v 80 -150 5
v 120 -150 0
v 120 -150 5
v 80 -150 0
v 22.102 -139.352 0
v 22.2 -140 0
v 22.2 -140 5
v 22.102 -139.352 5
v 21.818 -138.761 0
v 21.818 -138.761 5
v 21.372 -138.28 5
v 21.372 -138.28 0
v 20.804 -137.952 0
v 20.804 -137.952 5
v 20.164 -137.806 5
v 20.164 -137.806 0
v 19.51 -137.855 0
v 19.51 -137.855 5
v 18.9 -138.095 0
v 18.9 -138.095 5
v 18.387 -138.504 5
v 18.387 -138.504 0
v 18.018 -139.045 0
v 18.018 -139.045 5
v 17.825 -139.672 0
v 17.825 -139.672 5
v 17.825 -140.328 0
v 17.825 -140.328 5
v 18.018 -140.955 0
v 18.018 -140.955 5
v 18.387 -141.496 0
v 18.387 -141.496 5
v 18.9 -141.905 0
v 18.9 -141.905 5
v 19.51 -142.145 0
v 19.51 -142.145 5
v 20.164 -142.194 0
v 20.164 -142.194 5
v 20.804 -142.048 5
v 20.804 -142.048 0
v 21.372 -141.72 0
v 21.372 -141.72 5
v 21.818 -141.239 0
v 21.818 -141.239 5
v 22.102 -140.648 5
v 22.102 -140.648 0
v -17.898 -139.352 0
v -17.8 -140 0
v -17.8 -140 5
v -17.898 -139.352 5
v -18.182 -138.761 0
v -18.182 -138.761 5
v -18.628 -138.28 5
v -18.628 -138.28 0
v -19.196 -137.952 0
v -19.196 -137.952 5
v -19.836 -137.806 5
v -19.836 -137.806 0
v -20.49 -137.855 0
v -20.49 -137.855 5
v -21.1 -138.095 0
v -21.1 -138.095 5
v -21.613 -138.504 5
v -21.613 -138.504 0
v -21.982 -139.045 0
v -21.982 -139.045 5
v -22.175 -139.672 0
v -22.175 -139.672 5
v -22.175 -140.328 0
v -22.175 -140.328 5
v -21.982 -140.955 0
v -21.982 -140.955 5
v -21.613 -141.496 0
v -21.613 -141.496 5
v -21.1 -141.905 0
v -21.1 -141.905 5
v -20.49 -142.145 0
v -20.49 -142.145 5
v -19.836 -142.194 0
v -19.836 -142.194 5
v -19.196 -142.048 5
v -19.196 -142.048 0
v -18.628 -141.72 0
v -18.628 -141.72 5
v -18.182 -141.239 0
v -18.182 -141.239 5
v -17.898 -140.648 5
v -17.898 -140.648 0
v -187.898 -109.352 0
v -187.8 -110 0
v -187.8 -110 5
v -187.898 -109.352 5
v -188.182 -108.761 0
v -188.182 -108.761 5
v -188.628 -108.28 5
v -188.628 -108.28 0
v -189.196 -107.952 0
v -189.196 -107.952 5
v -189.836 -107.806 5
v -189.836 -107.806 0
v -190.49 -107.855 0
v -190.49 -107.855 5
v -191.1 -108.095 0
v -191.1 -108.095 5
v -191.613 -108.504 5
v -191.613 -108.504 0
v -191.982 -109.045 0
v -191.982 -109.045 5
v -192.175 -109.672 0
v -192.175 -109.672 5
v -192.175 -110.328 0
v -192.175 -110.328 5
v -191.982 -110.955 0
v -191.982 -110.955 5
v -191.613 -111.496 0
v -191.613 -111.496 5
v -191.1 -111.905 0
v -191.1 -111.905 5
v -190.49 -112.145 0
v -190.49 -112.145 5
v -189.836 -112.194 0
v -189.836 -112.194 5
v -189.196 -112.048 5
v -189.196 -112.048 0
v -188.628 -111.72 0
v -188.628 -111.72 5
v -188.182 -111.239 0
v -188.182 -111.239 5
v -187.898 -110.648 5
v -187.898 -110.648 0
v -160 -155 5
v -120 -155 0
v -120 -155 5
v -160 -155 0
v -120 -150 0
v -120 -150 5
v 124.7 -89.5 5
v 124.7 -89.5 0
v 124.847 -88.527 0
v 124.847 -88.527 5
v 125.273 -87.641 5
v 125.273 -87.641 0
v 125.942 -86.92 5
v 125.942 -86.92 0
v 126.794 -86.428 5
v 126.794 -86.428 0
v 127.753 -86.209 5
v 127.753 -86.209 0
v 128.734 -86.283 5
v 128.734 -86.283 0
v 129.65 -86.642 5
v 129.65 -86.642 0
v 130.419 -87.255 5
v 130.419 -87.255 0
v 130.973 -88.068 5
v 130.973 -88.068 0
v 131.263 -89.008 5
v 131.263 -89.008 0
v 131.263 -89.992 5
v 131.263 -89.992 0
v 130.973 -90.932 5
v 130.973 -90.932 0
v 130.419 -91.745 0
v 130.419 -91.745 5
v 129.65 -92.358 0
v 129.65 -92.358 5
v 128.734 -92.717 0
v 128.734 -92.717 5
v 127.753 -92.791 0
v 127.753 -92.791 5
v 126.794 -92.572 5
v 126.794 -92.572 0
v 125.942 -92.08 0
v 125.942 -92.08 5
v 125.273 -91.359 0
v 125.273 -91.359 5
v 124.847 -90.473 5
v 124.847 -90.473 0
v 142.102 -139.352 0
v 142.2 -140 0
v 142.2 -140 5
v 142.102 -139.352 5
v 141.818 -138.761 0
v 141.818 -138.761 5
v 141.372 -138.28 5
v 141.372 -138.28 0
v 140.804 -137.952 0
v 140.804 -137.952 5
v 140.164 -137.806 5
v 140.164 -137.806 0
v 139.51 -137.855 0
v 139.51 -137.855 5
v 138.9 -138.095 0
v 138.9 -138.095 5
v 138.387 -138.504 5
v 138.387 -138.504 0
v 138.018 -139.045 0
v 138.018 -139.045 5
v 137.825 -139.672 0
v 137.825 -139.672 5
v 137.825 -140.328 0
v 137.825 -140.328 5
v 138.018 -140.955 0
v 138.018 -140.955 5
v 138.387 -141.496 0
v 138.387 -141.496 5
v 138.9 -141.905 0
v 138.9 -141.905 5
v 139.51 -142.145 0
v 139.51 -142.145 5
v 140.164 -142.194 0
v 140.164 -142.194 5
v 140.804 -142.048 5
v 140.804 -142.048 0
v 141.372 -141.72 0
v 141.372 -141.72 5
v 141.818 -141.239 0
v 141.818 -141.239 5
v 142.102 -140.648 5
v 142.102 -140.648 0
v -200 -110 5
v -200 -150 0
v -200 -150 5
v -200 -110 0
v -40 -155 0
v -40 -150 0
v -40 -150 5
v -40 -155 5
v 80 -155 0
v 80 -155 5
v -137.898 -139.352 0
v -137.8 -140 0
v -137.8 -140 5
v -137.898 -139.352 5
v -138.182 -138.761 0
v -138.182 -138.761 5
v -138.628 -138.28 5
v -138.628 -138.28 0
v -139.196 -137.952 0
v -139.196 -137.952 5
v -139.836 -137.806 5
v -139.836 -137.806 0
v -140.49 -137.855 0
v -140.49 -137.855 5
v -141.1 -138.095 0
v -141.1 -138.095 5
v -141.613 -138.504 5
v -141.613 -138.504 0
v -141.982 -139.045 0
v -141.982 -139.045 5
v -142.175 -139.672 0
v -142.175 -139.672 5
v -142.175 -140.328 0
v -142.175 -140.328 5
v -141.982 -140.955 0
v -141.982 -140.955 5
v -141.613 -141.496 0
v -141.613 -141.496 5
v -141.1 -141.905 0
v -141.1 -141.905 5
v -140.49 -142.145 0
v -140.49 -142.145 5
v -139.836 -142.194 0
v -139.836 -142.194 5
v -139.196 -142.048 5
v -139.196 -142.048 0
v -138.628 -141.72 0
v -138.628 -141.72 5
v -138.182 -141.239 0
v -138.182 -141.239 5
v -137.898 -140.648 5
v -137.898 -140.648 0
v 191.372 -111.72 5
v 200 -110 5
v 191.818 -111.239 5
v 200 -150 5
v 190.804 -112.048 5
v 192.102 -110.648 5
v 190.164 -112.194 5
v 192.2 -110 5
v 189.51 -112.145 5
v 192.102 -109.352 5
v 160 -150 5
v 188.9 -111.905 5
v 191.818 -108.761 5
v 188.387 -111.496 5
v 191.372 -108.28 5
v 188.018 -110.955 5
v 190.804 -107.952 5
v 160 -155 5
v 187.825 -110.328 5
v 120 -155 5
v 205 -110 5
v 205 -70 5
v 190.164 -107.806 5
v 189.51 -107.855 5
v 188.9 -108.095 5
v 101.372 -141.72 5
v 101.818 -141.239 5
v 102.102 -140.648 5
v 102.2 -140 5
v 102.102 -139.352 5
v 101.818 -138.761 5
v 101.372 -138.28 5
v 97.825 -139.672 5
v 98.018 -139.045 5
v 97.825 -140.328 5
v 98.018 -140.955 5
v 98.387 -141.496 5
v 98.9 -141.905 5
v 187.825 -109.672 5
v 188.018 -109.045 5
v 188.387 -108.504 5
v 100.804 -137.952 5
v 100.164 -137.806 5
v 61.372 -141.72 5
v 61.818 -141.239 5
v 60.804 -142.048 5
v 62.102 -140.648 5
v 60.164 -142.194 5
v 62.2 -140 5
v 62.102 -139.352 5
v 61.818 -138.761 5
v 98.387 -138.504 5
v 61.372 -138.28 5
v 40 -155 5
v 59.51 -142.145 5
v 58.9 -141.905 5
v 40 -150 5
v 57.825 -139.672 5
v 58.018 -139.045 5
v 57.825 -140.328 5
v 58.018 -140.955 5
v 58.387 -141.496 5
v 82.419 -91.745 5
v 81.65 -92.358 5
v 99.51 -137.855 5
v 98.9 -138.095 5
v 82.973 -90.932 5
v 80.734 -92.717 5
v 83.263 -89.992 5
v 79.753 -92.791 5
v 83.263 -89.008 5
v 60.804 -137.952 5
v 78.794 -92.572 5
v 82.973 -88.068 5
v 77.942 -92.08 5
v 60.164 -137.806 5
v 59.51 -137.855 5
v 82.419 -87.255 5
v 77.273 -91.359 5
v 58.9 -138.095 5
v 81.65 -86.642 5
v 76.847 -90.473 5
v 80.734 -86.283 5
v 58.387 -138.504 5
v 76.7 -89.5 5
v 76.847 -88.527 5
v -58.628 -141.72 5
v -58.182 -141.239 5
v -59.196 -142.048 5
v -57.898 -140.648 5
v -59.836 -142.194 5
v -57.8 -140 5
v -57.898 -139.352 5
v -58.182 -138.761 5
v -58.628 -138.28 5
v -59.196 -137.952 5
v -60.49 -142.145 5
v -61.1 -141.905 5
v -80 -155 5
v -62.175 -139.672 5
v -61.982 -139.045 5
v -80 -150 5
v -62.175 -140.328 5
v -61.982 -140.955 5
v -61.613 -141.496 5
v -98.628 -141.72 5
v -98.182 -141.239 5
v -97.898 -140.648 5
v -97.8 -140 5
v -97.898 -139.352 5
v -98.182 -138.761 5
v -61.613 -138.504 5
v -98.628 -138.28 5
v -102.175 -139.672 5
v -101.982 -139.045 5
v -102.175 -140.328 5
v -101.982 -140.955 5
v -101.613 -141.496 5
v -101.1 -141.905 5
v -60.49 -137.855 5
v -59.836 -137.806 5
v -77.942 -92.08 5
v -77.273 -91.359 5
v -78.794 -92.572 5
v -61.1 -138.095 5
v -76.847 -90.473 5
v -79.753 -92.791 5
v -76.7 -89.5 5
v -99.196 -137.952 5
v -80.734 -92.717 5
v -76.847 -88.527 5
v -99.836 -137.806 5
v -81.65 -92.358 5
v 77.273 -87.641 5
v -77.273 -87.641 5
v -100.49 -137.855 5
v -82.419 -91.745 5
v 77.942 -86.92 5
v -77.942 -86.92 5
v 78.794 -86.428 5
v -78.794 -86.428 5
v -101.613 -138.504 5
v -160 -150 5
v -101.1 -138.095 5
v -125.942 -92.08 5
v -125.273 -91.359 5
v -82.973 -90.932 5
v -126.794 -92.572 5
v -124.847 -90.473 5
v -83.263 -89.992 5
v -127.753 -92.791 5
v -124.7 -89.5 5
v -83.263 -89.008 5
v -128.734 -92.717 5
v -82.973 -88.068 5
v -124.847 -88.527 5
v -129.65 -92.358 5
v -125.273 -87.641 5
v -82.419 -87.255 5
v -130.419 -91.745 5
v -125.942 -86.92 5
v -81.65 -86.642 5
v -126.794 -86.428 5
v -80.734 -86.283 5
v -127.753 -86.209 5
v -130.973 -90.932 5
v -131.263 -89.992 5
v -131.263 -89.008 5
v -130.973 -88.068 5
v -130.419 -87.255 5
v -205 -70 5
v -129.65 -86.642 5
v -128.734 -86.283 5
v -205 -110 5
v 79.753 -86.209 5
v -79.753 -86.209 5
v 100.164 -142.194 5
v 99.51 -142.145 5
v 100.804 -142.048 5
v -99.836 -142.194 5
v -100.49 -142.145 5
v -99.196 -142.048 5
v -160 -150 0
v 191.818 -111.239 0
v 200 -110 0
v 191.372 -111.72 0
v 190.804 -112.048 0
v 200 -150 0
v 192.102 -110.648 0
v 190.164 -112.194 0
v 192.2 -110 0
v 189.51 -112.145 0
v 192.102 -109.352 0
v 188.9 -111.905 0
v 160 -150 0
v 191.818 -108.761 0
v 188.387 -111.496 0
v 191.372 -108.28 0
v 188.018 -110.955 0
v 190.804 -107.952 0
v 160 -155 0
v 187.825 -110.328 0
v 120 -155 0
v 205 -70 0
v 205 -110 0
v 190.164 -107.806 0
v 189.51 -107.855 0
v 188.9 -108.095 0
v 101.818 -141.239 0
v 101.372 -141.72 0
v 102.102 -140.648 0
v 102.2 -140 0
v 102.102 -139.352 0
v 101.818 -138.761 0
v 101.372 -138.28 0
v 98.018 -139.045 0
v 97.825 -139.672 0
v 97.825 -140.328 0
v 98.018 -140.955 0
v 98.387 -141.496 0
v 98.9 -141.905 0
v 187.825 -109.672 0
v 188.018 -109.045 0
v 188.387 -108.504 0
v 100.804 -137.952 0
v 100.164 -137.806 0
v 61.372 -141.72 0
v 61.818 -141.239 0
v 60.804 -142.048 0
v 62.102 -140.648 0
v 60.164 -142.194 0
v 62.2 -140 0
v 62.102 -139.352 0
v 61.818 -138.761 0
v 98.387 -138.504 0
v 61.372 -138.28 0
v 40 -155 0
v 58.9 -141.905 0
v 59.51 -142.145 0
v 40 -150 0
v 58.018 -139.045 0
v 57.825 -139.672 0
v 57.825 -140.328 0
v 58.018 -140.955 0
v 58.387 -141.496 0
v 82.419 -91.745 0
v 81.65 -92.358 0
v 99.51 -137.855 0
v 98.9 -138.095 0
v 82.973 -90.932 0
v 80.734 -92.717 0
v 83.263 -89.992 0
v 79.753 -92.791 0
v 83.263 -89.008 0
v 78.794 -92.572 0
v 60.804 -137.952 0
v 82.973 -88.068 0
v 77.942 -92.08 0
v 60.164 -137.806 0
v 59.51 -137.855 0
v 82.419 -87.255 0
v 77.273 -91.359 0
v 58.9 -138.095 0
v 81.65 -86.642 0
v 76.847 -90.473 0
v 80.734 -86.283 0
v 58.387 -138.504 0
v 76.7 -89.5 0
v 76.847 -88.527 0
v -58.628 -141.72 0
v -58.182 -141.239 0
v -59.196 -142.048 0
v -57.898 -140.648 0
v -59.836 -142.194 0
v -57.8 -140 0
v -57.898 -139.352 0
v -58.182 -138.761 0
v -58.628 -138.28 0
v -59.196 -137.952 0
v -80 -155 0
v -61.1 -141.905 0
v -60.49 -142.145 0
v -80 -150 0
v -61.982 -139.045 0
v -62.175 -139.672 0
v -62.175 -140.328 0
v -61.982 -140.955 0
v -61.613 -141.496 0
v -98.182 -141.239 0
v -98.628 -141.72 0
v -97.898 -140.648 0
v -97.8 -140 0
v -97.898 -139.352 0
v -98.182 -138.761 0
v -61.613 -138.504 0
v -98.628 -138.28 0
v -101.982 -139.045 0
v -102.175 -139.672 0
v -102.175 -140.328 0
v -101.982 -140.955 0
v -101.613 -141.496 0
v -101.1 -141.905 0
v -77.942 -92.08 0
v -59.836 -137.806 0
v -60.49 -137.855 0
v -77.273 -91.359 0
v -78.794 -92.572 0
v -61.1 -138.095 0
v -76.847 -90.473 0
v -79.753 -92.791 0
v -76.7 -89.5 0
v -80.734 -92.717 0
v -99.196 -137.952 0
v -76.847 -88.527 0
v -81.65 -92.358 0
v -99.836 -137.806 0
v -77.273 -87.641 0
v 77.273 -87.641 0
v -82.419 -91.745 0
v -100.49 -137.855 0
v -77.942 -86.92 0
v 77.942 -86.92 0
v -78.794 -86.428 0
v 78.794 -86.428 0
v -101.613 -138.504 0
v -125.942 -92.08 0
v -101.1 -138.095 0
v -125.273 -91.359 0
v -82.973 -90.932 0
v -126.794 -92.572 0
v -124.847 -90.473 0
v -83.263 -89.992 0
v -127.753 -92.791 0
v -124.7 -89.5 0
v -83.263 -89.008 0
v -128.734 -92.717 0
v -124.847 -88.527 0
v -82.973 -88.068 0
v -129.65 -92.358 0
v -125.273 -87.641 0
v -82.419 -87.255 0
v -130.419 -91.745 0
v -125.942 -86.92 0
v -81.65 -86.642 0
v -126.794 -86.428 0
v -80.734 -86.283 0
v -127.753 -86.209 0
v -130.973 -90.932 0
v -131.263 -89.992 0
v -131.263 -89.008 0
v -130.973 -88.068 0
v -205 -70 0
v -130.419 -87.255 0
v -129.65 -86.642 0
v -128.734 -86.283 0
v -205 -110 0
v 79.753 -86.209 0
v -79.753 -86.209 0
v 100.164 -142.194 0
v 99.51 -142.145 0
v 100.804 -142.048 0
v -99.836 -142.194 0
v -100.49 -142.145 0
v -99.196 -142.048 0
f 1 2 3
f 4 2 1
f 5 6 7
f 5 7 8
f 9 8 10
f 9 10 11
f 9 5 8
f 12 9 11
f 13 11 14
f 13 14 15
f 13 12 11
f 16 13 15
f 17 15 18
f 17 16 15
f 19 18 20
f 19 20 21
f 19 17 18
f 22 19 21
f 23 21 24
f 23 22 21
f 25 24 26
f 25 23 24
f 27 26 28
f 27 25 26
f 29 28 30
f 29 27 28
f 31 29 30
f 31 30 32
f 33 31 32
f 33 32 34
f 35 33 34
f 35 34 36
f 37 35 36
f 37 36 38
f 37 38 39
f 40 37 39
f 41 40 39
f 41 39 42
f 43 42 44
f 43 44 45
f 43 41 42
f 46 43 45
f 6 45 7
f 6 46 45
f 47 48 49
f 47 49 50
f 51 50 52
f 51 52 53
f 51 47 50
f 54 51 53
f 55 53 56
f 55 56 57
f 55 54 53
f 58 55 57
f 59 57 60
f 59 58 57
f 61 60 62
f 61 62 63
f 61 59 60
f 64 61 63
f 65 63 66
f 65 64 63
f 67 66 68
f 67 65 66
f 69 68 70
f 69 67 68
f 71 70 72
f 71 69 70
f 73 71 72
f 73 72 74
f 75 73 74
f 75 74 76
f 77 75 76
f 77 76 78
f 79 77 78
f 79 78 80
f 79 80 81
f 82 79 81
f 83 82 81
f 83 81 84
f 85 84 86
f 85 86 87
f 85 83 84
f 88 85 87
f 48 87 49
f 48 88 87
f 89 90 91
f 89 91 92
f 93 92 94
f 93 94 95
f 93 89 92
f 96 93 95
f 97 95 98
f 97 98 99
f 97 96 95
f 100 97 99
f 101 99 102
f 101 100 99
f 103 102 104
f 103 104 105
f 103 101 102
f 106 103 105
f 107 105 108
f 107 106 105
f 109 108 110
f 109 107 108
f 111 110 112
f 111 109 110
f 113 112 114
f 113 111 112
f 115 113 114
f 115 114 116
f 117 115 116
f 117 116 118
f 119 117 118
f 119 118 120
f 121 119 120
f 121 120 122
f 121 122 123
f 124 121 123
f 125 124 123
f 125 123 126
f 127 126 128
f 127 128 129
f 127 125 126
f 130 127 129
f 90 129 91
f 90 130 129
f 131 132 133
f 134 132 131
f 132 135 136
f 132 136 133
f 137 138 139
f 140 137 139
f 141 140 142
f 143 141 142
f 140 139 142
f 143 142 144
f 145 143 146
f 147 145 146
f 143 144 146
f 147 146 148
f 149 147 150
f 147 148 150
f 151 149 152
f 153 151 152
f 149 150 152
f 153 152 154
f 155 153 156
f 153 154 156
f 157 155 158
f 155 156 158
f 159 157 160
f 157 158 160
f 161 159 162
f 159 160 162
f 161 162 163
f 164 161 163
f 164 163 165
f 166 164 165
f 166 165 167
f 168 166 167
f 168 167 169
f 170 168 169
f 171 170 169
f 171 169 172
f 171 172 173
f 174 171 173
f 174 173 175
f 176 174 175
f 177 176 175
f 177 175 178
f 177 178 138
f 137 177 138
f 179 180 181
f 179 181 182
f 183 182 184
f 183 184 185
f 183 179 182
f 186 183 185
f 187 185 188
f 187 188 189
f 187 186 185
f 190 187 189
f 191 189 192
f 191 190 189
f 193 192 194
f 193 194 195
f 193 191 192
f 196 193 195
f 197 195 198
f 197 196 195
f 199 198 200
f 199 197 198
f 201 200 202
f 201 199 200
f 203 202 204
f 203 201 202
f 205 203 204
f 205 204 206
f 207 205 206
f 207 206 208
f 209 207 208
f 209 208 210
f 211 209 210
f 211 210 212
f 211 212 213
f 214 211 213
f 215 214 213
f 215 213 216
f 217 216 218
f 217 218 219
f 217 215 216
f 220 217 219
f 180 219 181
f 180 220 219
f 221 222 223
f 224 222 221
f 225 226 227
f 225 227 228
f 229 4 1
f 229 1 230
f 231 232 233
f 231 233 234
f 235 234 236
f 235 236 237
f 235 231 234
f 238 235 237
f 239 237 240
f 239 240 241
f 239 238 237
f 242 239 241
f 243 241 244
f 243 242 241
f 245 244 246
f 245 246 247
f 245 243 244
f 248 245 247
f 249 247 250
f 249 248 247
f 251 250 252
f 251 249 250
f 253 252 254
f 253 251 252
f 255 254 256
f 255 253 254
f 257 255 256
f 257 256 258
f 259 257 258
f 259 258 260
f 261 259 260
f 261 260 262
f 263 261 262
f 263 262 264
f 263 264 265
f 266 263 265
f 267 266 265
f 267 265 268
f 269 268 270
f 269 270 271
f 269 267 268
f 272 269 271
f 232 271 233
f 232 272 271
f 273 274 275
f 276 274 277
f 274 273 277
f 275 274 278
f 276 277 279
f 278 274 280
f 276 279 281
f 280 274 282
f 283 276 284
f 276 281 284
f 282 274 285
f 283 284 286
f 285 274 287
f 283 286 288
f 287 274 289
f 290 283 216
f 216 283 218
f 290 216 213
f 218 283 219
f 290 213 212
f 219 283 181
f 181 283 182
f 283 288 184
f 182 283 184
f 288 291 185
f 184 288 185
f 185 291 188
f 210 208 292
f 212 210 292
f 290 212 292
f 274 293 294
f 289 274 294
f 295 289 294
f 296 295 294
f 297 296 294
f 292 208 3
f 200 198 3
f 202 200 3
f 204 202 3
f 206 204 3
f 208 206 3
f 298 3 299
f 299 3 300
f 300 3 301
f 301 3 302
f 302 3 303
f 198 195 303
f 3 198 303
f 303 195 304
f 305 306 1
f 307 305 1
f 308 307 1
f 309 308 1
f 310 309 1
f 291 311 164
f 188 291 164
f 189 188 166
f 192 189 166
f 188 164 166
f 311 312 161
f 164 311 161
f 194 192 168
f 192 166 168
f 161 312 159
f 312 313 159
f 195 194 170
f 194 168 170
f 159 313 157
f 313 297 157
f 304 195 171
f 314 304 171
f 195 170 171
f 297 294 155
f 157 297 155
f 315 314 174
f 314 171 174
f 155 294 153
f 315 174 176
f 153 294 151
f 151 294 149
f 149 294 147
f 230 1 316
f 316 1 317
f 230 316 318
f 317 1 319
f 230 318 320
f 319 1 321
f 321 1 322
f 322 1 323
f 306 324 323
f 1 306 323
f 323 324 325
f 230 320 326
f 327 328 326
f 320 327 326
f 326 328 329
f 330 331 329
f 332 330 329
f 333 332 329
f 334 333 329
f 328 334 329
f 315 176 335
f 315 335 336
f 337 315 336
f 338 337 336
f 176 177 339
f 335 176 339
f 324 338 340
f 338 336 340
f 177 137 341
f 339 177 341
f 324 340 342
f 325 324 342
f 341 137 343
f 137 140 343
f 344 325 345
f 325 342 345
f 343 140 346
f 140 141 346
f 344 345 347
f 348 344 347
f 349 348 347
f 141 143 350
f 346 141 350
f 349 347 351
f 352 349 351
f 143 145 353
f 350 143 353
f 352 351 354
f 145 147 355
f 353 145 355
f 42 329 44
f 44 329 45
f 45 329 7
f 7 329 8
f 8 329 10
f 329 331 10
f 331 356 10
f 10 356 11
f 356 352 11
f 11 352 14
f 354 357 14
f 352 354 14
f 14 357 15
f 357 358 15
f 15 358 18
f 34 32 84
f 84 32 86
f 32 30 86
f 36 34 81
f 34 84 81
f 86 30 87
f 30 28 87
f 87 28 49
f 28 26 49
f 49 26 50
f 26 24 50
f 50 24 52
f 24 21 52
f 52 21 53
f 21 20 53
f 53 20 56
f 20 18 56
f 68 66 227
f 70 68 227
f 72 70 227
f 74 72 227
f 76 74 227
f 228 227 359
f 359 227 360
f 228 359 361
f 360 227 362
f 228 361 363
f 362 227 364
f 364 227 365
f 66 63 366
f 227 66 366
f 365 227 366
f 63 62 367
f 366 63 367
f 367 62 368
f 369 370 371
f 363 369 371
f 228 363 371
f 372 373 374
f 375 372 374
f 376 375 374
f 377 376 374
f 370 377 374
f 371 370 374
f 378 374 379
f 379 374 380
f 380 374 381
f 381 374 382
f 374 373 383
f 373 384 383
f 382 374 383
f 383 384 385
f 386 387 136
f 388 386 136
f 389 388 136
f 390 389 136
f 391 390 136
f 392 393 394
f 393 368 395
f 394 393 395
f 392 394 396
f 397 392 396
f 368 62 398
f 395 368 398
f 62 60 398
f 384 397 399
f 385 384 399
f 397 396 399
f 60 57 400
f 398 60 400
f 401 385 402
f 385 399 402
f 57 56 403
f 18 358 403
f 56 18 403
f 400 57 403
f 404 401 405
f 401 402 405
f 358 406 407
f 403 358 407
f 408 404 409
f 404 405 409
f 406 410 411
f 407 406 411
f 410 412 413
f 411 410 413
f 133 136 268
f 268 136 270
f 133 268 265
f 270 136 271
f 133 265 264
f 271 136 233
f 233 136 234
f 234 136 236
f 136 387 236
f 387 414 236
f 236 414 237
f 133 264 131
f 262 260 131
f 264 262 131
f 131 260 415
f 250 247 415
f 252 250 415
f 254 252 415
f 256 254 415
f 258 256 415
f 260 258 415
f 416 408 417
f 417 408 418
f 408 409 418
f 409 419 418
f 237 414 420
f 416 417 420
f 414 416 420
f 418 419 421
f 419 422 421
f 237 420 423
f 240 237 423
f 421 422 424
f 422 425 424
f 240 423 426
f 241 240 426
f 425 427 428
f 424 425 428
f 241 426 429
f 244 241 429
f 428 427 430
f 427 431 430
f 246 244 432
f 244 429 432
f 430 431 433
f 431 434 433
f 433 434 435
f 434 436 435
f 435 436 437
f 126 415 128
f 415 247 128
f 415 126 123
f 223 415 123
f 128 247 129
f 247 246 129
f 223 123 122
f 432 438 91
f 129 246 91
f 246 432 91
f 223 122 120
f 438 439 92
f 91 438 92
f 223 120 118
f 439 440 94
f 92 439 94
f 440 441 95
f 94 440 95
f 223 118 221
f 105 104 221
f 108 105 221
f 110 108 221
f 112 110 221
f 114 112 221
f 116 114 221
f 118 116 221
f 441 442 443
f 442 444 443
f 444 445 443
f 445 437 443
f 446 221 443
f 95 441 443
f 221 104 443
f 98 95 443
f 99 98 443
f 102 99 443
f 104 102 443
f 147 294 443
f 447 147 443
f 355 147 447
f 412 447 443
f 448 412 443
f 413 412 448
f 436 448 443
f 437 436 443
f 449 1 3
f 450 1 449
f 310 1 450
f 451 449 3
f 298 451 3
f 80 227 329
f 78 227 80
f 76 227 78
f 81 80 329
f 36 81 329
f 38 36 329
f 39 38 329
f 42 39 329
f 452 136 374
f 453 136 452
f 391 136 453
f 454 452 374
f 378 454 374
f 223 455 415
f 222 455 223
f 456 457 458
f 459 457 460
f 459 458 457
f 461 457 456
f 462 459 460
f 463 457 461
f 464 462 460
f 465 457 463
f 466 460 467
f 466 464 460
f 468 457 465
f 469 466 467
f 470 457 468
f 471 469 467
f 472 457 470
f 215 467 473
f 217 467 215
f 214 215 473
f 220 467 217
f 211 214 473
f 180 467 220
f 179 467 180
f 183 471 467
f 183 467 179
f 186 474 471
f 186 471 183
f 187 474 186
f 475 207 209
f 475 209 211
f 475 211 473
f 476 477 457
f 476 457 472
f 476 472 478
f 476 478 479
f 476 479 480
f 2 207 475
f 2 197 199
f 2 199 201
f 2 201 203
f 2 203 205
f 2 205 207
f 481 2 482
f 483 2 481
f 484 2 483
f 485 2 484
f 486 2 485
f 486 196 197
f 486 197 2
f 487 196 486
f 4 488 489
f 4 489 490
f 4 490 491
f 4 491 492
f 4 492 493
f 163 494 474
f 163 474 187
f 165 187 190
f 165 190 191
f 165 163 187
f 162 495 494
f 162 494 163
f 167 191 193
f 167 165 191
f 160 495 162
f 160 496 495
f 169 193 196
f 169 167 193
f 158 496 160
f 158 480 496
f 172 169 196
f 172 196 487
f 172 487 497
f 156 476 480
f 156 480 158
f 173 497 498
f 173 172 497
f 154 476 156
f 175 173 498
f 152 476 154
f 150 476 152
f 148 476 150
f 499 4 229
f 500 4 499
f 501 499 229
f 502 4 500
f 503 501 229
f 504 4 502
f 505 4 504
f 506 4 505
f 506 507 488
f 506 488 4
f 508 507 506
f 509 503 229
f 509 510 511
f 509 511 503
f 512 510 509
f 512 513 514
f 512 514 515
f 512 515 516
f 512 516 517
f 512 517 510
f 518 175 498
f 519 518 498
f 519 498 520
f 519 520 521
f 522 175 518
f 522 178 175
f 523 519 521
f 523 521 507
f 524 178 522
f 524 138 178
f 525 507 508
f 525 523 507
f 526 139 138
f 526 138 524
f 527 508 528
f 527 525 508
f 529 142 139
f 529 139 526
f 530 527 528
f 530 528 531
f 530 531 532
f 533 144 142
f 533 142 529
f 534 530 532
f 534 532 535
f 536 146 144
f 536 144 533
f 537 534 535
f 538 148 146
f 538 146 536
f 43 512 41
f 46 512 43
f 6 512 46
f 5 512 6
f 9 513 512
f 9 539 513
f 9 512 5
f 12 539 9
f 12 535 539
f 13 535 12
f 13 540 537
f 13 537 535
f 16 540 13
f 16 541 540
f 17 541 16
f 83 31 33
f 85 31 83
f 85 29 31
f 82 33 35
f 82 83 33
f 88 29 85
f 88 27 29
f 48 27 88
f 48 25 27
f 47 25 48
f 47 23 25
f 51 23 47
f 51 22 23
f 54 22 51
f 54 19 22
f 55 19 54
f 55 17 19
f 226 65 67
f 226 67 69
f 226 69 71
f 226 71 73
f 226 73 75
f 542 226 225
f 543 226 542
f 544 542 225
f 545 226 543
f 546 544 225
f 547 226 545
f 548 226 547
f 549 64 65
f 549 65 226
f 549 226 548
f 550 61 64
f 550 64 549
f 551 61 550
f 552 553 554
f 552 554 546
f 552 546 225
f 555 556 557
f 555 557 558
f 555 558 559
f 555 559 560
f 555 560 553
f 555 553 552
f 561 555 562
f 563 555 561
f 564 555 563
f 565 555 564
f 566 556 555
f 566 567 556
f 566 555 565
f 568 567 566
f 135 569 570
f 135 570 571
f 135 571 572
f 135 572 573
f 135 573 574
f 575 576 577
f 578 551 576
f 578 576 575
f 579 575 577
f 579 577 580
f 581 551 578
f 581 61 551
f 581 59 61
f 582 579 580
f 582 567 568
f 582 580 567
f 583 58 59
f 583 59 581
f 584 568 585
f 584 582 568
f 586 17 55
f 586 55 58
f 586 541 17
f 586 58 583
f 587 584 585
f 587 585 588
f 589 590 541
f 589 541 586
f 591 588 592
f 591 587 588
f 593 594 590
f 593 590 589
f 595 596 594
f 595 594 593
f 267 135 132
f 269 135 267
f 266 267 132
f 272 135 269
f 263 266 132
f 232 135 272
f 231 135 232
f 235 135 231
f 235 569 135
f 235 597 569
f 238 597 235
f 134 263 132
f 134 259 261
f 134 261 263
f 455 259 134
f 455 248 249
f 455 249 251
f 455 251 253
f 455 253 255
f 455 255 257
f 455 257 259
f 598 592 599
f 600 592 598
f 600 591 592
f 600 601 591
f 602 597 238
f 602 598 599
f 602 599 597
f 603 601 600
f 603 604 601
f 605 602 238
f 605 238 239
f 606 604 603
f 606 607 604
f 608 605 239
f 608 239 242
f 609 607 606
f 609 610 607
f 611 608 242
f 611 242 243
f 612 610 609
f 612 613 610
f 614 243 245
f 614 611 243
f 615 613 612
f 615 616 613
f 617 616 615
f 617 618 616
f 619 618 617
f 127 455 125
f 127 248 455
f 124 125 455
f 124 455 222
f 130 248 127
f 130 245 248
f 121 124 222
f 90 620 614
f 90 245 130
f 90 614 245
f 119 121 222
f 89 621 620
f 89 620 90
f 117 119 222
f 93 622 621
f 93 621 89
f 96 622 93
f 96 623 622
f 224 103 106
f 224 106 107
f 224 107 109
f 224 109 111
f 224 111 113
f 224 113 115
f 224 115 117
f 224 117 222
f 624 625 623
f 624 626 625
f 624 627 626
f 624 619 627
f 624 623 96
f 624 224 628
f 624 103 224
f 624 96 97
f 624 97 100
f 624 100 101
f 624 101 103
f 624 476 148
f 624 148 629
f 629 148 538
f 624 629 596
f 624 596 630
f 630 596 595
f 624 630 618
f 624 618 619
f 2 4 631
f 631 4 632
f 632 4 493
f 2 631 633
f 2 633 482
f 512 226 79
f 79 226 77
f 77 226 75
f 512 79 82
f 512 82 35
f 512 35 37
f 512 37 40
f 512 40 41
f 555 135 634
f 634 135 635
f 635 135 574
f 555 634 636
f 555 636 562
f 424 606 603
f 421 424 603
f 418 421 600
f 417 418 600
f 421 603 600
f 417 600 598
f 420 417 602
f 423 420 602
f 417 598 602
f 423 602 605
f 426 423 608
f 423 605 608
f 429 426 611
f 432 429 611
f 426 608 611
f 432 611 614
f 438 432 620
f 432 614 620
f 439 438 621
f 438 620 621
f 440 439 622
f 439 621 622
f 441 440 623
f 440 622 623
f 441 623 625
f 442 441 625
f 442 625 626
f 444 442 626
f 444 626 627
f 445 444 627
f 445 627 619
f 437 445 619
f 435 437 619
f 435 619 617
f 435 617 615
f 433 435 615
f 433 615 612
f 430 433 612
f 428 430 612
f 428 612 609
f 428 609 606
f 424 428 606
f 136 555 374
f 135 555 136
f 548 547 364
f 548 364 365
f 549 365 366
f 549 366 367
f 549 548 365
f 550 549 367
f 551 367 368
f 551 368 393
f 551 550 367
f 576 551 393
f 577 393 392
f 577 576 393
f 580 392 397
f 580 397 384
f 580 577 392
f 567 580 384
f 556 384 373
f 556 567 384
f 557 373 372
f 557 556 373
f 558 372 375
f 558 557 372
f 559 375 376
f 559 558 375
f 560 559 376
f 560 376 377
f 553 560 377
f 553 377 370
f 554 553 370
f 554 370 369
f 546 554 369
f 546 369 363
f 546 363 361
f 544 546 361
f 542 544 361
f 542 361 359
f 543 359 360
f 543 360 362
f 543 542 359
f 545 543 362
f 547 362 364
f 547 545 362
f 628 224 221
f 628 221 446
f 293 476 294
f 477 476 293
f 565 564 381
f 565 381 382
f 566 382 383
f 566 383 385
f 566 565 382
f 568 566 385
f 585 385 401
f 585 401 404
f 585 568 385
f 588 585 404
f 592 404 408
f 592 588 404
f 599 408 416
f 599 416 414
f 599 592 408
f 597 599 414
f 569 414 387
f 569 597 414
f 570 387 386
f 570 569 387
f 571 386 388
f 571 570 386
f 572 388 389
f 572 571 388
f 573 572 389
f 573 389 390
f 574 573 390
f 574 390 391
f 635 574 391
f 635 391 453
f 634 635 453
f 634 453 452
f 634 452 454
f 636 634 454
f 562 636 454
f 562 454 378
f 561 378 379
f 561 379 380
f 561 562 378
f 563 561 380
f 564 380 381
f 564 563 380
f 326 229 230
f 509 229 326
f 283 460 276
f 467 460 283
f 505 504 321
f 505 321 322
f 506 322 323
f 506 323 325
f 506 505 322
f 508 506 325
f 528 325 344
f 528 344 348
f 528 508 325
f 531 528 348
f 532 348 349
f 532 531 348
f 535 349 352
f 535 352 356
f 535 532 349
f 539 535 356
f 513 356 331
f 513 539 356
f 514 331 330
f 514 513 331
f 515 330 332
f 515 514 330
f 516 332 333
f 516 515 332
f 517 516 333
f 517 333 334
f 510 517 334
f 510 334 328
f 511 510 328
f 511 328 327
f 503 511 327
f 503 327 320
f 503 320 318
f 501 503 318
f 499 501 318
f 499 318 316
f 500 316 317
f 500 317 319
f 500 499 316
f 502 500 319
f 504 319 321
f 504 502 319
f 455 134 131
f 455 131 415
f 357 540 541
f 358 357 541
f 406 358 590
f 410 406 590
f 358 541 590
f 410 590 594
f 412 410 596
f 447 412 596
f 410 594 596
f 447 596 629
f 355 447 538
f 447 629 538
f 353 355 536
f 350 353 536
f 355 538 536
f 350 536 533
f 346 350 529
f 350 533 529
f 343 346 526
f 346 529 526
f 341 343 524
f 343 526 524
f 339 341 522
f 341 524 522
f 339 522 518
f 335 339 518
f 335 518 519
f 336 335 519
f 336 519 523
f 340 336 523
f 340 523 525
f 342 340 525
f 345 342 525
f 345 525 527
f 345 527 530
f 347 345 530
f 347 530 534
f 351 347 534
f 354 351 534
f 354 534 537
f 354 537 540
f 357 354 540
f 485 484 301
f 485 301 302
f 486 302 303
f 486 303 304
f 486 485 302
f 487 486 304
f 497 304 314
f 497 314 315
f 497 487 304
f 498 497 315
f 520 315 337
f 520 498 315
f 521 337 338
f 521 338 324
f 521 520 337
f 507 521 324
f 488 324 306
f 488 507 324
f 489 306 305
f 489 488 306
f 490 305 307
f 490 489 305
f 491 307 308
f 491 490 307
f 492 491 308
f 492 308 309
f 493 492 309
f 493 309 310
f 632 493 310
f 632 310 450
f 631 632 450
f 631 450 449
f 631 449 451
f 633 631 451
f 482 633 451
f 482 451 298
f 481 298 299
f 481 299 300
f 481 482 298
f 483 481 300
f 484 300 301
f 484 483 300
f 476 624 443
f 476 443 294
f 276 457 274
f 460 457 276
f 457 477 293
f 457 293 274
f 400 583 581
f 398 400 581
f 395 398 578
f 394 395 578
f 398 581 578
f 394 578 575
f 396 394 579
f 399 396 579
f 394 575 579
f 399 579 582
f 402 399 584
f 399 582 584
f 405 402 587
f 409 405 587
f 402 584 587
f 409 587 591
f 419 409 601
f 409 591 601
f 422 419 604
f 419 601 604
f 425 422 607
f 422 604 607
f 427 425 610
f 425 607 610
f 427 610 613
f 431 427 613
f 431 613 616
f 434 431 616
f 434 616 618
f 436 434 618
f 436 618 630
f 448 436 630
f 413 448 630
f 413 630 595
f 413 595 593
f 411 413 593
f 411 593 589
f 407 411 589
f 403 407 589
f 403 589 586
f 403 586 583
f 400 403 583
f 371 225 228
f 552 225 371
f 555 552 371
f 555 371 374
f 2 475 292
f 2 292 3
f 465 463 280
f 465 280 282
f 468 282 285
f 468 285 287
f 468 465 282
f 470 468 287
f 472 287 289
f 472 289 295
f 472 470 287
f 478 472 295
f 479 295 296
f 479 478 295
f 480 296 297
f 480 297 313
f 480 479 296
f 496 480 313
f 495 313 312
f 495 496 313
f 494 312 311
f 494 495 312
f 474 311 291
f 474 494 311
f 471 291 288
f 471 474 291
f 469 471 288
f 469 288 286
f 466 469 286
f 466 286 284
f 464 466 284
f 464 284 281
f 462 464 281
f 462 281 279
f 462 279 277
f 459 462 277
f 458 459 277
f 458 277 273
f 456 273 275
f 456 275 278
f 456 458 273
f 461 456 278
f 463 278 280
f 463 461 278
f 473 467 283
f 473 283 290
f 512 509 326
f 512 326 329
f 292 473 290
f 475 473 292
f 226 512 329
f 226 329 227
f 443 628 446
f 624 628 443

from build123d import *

# Parameters (mm, degrees)
SKETCH_1_R          = 2.2
EXTRUDE_1_DEPTH     = 5
SKETCH_2_W          = 410
SKETCH_2_H          = 226.105378696
CUT_EXTRUDE_2_DEPTH = 5
SKETCH_4_W          = 410
SKETCH_4_H          = 19.486670542
EXTRUDE_3_DEPTH     = 5
SKETCH_5_R          = 3.3
CUT_EXTRUDE_3_DEPTH = 10


with BuildPart() as part:
    # 草图1 → 凸台-拉伸1 (new body)
    with BuildSketch(Plane.XY):
        Polygon((-200, 150), (200, 150), (200, 110), (205, 110), (205, 70), (200, 70), (200, 30), (205, 30), (205, -30), (200, -30), (200, -70), (205, -70), (205, -110), (200, -110), (200, -150), (160, -150), (160, -155), (120, -155), (120, -150), (80, -150), (80, -155), (40, -155), (40, -150), (-40, -150), (-40, -155), (-80, -155), (-80, -150), (-120, -150), (-120, -155), (-160, -155), (-160, -150), (-200, -150), (-200, -110), (-205, -110), (-205, -70), (-200, -70), (-200, -30), (-205, -30), (-205, 30), (-200, 30), (-200, 70), (-205, 70), (-205, 110), (-200, 110), align=None)
        with Locations((-140, -140)):
            Circle(SKETCH_1_R, mode=Mode.SUBTRACT)
        with Locations((-100, -140)):
            Circle(SKETCH_1_R, mode=Mode.SUBTRACT)
        with Locations((-60, -140)):
            Circle(SKETCH_1_R, mode=Mode.SUBTRACT)
        with Locations((-20, -140)):
            Circle(SKETCH_1_R, mode=Mode.SUBTRACT)
        with Locations((20, -140)):
            Circle(SKETCH_1_R, mode=Mode.SUBTRACT)
        with Locations((60, -140)):
            Circle(SKETCH_1_R, mode=Mode.SUBTRACT)
        with Locations((100, -140)):
            Circle(SKETCH_1_R, mode=Mode.SUBTRACT)
        with Locations((140, -140)):
            Circle(SKETCH_1_R, mode=Mode.SUBTRACT)
        with Locations((-190, 110)):
            Circle(SKETCH_1_R, mode=Mode.SUBTRACT)
        with Locations((-190, 70)):
            Circle(SKETCH_1_R, mode=Mode.SUBTRACT)
        with Locations((-190, 30)):
            Circle(SKETCH_1_R, mode=Mode.SUBTRACT)
        with Locations((-190, -30)):
            Circle(SKETCH_1_R, mode=Mode.SUBTRACT)
        with Locations((-190, -70)):
            Circle(SKETCH_1_R, mode=Mode.SUBTRACT)
        with Locations((-190, -110)):
            Circle(SKETCH_1_R, mode=Mode.SUBTRACT)
        with Locations((190, -110)):
            Circle(SKETCH_1_R, mode=Mode.SUBTRACT)
        with Locations((190, -70)):
            Circle(SKETCH_1_R, mode=Mode.SUBTRACT)
        with Locations((190, -30)):
            Circle(SKETCH_1_R, mode=Mode.SUBTRACT)
        with Locations((190, 30)):
            Circle(SKETCH_1_R, mode=Mode.SUBTRACT)
        with Locations((190, 70)):
            Circle(SKETCH_1_R, mode=Mode.SUBTRACT)
        with Locations((190, 110)):
            Circle(SKETCH_1_R, mode=Mode.SUBTRACT)
    extrude(amount=EXTRUDE_1_DEPTH)

    # 草图2 → 切除-拉伸2 (cut)
    with BuildSketch(Plane.XY.offset(5)):
        with Locations((0, 43.052689348)):
            Rectangle(SKETCH_2_W, SKETCH_2_H)
    extrude(amount=-CUT_EXTRUDE_2_DEPTH, mode=Mode.SUBTRACT)

    # 草图4 → 凸台-拉伸3 (add)
    with BuildSketch(Plane.XY.offset(5)):
        with Locations((0, -79.743335271)):
            Rectangle(SKETCH_4_W, SKETCH_4_H)
    extrude(amount=-EXTRUDE_3_DEPTH)

    # 草图5 → 切除-拉伸3 (cut)
    with BuildSketch(Plane(origin=(0, 0, 0), x_dir=(-1, 0, 0), z_dir=(0, 0, -1))):
        with Locations((-80, -89.5)):
            Circle(SKETCH_5_R)
        with Locations((-128, -89.5)):
            Circle(SKETCH_5_R)
        with Locations(Location((128, -89.5, 0), (0, 0, 180))):
            Circle(SKETCH_5_R)
        with Locations(Location((80, -89.5, 0), (0, 0, 180))):
            Circle(SKETCH_5_R)
    extrude(amount=-CUT_EXTRUDE_3_DEPTH, mode=Mode.SUBTRACT)


solid = part.part
